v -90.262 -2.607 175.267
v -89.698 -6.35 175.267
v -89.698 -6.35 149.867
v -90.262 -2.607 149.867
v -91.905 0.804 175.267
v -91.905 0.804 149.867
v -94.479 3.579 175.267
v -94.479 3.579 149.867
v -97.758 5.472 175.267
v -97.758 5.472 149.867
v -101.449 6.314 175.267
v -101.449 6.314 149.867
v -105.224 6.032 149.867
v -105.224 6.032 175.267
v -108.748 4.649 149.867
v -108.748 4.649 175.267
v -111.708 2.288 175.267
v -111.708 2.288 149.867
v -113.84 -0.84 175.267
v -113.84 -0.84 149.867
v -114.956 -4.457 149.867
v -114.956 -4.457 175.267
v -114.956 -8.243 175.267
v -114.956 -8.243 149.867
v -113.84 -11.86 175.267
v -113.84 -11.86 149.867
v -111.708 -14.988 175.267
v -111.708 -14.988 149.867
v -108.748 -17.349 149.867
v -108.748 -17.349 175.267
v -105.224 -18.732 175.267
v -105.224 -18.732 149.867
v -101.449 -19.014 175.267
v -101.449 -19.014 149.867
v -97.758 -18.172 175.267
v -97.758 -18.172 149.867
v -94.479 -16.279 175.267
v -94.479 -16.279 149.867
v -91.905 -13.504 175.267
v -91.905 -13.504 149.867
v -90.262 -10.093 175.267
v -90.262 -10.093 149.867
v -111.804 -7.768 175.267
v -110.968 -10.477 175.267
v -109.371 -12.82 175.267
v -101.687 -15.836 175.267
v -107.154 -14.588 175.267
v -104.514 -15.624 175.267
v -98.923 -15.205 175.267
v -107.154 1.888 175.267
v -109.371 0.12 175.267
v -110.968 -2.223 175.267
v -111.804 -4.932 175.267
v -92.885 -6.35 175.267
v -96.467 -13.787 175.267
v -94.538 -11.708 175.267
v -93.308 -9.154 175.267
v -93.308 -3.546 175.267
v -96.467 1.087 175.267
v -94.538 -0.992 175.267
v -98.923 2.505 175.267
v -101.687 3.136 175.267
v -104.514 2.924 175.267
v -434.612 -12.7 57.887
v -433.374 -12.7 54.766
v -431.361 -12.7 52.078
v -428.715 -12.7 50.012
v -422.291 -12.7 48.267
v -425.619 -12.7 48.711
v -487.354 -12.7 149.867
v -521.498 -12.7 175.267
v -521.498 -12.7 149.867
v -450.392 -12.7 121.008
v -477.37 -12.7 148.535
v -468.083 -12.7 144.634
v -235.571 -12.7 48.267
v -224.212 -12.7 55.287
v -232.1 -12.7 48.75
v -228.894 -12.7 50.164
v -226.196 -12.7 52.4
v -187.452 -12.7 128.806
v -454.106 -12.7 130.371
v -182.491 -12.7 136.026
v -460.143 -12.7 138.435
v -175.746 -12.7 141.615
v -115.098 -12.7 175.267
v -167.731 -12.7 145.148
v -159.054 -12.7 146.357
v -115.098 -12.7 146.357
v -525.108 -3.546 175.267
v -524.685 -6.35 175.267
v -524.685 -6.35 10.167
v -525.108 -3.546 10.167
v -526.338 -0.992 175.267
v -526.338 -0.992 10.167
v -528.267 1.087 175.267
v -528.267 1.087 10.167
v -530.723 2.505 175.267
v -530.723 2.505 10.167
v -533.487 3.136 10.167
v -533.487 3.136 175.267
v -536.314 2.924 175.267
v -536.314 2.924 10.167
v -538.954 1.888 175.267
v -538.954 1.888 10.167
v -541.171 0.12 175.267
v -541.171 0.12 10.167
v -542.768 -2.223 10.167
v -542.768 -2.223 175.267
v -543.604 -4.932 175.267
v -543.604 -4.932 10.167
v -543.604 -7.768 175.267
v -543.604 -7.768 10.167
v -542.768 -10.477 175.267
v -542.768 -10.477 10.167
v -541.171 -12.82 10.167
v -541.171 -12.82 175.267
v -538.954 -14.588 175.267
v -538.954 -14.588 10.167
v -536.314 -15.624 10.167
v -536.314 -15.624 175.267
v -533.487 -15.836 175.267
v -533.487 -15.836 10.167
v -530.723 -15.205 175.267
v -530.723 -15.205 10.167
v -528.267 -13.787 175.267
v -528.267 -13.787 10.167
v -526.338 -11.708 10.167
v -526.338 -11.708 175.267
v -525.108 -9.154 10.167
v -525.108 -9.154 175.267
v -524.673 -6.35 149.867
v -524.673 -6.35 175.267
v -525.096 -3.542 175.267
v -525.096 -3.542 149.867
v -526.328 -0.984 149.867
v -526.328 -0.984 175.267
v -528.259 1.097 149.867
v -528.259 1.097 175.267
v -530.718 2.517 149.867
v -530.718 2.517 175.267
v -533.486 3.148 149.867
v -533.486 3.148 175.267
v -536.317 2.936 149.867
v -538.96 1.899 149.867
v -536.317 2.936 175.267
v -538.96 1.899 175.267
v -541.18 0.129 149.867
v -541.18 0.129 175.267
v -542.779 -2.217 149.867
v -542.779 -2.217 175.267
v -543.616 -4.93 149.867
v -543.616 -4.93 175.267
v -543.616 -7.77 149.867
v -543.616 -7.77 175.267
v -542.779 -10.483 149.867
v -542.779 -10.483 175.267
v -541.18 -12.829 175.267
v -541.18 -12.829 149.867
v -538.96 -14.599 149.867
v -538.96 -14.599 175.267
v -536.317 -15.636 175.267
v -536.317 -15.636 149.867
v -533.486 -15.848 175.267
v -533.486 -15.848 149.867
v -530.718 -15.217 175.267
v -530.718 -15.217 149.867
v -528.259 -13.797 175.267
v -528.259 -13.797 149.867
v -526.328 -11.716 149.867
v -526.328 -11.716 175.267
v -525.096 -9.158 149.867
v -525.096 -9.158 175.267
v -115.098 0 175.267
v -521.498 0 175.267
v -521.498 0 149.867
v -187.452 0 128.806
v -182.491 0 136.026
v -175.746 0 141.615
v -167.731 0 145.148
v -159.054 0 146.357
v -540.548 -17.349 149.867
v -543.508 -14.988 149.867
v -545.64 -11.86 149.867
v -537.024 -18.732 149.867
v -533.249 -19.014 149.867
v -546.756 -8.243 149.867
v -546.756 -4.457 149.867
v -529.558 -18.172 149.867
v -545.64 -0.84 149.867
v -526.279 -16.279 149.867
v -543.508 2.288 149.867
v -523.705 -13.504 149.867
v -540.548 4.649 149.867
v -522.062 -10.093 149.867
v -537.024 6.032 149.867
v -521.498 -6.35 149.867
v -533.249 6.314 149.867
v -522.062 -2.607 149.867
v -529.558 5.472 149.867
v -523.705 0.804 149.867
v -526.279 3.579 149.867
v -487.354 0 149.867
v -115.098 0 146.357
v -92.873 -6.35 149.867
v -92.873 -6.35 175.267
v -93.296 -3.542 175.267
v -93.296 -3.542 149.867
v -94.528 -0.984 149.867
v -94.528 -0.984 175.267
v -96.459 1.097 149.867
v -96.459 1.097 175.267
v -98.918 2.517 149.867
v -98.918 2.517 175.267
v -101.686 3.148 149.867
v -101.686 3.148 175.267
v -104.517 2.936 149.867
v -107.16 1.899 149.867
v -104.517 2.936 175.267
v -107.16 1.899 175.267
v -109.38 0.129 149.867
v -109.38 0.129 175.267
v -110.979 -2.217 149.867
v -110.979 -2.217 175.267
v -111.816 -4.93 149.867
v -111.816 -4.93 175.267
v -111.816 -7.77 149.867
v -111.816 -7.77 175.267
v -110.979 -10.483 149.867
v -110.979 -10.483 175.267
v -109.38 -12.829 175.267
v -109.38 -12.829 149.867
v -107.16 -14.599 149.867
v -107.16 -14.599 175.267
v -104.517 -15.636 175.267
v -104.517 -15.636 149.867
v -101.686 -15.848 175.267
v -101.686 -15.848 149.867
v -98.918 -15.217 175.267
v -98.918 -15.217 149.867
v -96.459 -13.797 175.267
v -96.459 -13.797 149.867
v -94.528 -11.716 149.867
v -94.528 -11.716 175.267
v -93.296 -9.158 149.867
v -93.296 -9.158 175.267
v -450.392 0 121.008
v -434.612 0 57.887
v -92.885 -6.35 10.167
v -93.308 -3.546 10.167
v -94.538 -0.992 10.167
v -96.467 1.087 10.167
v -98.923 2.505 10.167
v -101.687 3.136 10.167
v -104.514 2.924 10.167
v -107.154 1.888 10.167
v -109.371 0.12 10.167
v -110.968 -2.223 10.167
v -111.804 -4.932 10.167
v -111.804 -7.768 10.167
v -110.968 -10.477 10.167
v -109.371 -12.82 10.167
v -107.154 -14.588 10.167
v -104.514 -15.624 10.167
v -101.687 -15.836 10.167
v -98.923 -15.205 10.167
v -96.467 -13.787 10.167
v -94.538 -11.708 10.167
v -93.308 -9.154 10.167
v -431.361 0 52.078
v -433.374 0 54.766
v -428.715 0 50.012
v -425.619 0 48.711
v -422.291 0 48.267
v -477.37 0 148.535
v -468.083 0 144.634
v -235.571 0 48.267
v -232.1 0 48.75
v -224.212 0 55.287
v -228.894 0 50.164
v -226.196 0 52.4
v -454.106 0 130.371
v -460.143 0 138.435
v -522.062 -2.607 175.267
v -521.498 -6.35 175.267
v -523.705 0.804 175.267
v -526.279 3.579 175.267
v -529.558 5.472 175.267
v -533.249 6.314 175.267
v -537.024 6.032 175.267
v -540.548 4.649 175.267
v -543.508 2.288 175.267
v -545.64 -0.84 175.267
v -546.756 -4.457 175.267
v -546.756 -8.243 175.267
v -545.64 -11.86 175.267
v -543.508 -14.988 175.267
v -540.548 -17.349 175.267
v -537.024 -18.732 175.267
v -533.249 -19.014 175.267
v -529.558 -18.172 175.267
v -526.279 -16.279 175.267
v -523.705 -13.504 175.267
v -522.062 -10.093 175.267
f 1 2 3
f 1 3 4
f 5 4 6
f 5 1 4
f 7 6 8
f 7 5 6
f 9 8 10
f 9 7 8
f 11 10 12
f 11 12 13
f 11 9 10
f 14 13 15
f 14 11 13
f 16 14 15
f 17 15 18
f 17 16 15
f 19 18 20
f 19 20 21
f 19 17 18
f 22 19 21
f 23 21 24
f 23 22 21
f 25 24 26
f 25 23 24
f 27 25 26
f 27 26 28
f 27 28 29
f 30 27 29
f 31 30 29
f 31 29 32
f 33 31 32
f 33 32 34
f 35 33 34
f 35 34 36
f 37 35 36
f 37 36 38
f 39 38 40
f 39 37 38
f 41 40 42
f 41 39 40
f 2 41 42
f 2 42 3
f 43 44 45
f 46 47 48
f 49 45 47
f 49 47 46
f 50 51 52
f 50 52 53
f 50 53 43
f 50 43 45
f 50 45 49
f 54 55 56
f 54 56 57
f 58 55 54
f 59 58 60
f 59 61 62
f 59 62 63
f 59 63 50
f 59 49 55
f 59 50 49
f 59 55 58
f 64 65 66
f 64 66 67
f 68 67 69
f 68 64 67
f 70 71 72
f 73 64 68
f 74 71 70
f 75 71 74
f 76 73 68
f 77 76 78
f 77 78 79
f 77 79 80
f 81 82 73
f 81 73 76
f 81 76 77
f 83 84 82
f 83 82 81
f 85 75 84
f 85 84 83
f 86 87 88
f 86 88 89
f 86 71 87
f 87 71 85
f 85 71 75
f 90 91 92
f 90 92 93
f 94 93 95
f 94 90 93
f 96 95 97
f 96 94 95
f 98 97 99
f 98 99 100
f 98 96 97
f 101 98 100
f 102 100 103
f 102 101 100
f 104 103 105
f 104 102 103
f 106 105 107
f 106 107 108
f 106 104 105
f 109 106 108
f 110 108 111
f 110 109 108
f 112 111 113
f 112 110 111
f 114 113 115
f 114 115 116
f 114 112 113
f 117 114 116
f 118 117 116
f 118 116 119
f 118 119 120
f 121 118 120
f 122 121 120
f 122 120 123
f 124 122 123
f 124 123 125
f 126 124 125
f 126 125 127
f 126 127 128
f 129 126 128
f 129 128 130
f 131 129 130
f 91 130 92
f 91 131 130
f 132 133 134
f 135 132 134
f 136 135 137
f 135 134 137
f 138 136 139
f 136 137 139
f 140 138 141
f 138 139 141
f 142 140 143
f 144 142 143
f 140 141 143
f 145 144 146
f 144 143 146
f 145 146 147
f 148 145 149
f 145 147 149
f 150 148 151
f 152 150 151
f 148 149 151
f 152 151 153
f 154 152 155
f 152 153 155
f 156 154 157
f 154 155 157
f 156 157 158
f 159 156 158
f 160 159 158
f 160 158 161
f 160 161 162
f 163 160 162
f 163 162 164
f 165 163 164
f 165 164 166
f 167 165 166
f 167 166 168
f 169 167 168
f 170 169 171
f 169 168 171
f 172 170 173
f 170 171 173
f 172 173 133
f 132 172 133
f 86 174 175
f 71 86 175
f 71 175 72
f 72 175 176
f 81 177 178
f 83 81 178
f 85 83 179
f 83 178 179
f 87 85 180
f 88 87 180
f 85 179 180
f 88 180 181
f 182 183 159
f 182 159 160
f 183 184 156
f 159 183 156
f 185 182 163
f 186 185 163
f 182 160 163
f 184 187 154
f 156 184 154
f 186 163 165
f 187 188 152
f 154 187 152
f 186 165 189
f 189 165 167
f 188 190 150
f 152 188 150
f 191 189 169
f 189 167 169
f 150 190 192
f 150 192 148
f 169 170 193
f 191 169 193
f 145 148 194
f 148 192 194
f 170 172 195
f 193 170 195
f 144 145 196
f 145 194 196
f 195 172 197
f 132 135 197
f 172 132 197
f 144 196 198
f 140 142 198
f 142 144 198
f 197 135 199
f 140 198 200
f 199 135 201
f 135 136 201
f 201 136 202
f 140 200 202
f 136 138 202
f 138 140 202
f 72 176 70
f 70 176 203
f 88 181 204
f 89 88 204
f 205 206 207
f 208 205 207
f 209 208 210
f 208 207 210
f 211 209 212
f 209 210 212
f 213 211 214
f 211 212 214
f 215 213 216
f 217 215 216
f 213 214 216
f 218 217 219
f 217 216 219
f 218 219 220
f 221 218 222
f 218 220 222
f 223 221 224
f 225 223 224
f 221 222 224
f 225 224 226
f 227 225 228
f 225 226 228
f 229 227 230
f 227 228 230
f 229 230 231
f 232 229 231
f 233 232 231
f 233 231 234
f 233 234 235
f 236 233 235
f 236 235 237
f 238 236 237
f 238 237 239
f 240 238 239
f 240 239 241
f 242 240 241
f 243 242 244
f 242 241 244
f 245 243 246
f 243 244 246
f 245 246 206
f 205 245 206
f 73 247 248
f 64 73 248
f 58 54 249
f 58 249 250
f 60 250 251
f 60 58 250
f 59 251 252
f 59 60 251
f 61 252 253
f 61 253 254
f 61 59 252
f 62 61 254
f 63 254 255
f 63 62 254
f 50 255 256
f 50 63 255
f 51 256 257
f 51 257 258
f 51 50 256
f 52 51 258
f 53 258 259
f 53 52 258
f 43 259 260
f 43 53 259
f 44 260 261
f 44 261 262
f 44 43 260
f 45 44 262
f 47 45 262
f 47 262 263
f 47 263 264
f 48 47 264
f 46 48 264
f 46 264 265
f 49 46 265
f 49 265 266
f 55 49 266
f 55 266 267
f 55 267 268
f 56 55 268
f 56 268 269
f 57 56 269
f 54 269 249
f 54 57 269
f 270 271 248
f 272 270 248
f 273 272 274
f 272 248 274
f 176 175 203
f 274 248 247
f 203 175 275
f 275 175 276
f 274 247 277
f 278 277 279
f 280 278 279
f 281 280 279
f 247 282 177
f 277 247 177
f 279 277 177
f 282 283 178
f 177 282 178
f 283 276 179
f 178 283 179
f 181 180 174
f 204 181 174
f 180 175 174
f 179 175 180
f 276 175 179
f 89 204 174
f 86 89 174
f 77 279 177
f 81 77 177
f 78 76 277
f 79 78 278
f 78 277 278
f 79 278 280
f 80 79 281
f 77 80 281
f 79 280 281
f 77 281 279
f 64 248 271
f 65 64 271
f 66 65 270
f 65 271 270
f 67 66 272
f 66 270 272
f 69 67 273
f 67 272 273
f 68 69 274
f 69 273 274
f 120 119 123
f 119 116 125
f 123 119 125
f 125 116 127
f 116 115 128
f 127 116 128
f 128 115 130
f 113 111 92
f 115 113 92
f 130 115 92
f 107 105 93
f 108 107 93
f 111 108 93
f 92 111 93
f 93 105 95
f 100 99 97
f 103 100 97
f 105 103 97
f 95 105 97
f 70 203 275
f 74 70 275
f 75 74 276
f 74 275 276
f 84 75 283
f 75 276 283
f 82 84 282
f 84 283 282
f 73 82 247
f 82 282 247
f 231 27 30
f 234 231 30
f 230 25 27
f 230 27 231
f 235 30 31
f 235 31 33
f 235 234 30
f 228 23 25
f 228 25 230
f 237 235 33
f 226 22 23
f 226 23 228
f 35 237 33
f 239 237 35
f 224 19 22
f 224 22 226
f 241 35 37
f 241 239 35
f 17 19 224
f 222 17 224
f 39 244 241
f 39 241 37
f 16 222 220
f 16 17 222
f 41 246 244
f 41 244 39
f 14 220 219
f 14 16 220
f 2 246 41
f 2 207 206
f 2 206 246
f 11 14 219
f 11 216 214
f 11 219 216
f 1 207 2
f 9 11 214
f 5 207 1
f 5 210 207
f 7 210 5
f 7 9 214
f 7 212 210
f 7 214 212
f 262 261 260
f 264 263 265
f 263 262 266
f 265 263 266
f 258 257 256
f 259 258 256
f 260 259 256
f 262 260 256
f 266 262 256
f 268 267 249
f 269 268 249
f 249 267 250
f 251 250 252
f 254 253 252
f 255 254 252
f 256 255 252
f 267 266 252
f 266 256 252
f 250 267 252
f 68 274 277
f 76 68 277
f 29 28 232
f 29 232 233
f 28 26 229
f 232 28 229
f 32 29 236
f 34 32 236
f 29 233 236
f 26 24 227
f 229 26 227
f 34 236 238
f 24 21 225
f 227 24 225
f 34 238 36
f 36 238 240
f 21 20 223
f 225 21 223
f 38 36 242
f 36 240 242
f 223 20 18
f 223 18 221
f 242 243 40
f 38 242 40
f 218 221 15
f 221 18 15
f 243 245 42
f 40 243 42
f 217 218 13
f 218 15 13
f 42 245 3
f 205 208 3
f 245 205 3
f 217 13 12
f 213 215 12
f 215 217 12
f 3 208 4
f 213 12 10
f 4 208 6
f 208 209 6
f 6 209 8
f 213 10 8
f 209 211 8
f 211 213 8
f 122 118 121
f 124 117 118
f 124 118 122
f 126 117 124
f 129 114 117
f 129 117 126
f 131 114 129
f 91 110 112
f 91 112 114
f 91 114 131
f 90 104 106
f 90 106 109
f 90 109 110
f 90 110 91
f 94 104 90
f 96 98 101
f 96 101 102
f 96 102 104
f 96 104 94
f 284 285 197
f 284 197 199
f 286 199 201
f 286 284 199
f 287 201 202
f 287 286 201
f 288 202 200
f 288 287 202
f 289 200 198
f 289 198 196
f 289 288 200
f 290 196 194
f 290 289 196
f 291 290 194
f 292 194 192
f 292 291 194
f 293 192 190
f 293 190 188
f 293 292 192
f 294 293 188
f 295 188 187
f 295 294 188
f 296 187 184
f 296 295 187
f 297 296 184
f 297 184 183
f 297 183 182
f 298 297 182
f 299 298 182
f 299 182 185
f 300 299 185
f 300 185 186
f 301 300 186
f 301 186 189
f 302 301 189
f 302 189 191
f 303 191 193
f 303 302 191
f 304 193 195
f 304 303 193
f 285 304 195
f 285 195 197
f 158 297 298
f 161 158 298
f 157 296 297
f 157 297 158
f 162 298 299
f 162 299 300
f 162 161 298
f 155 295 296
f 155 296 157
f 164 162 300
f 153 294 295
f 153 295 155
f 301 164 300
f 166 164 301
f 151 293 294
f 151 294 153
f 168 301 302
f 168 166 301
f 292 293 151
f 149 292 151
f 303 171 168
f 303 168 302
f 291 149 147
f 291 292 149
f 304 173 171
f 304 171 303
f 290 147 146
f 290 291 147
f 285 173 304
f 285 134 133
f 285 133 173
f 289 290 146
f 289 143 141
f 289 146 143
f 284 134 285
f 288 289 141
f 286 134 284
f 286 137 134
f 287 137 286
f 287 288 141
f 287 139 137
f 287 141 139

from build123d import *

# Parameters (mm, degrees)
F1_DEPTH = 12.7
F2_R     = 12.7
F2_R_2   = 9.525
F3_DEPTH = 25.4
F4_R     = 9.5123
F5_DEPTH = 165.1


with BuildPart() as f1:
    # F0 (on Front) → F1 (new body)
    with BuildSketch(Plane.XZ):
        with BuildLine():
            Line((-521.497744, 149.86705), (-487.354465, 149.86705))
            ThreePointArc((-487.354465, 149.86705), (-463.90726, 141.797678), (-450.392036, 121.007658))
            Line((-450.392036, 121.007658), (-434.611833, 57.886848))
            ThreePointArc((-434.611833, 57.886848), (-430.106759, 50.956841), (-422.291024, 48.26705))
            Line((-422.291024, 48.26705), (-235.570808, 48.26705))
            ThreePointArc((-235.570808, 48.26705), (-228.894023, 50.163785), (-224.211582, 55.287438))
            Line((-224.211582, 55.287438), (-187.452357, 128.805888))
            ThreePointArc((-187.452357, 128.805888), (-175.746256, 141.61502), (-159.054294, 146.356857))
            Line((-159.054294, 146.356857), (-115.097744, 146.356857))
            Line((-115.097744, 146.356857), (-115.097744, 175.26705))
            Line((-115.097744, 175.26705), (-521.497744, 175.26705))
            Line((-521.497744, 175.26705), (-521.497744, 149.86705))
        make_face()
    extrude(amount=F1_DEPTH)


with BuildPart() as f3:
    # F2 (on face) → F3 (new body)
    with BuildSketch(Plane.XY.offset(175.26705)):
        with Locations((-102.397744, -6.35)):
            Circle(F2_R)
        with Locations((-102.397744, -6.35)):
            Circle(F2_R_2, mode=Mode.SUBTRACT)
        with Locations((-534.197744, -6.35)):
            Circle(F2_R)
        with Locations((-534.197744, -6.35)):
            Circle(F2_R_2, mode=Mode.SUBTRACT)
    extrude(amount=-F3_DEPTH)


with BuildPart() as f5:
    # F4 (on face) → F5 (new body)
    with BuildSketch(Plane.XY.offset(175.26705)):
        with Locations((-102.397744, -6.35)):
            Circle(F4_R)
        with Locations((-534.197744, -6.35)):
            Circle(F4_R)
    extrude(amount=-F5_DEPTH)


solid = Compound([f1.part, f3.part, f5.part])
